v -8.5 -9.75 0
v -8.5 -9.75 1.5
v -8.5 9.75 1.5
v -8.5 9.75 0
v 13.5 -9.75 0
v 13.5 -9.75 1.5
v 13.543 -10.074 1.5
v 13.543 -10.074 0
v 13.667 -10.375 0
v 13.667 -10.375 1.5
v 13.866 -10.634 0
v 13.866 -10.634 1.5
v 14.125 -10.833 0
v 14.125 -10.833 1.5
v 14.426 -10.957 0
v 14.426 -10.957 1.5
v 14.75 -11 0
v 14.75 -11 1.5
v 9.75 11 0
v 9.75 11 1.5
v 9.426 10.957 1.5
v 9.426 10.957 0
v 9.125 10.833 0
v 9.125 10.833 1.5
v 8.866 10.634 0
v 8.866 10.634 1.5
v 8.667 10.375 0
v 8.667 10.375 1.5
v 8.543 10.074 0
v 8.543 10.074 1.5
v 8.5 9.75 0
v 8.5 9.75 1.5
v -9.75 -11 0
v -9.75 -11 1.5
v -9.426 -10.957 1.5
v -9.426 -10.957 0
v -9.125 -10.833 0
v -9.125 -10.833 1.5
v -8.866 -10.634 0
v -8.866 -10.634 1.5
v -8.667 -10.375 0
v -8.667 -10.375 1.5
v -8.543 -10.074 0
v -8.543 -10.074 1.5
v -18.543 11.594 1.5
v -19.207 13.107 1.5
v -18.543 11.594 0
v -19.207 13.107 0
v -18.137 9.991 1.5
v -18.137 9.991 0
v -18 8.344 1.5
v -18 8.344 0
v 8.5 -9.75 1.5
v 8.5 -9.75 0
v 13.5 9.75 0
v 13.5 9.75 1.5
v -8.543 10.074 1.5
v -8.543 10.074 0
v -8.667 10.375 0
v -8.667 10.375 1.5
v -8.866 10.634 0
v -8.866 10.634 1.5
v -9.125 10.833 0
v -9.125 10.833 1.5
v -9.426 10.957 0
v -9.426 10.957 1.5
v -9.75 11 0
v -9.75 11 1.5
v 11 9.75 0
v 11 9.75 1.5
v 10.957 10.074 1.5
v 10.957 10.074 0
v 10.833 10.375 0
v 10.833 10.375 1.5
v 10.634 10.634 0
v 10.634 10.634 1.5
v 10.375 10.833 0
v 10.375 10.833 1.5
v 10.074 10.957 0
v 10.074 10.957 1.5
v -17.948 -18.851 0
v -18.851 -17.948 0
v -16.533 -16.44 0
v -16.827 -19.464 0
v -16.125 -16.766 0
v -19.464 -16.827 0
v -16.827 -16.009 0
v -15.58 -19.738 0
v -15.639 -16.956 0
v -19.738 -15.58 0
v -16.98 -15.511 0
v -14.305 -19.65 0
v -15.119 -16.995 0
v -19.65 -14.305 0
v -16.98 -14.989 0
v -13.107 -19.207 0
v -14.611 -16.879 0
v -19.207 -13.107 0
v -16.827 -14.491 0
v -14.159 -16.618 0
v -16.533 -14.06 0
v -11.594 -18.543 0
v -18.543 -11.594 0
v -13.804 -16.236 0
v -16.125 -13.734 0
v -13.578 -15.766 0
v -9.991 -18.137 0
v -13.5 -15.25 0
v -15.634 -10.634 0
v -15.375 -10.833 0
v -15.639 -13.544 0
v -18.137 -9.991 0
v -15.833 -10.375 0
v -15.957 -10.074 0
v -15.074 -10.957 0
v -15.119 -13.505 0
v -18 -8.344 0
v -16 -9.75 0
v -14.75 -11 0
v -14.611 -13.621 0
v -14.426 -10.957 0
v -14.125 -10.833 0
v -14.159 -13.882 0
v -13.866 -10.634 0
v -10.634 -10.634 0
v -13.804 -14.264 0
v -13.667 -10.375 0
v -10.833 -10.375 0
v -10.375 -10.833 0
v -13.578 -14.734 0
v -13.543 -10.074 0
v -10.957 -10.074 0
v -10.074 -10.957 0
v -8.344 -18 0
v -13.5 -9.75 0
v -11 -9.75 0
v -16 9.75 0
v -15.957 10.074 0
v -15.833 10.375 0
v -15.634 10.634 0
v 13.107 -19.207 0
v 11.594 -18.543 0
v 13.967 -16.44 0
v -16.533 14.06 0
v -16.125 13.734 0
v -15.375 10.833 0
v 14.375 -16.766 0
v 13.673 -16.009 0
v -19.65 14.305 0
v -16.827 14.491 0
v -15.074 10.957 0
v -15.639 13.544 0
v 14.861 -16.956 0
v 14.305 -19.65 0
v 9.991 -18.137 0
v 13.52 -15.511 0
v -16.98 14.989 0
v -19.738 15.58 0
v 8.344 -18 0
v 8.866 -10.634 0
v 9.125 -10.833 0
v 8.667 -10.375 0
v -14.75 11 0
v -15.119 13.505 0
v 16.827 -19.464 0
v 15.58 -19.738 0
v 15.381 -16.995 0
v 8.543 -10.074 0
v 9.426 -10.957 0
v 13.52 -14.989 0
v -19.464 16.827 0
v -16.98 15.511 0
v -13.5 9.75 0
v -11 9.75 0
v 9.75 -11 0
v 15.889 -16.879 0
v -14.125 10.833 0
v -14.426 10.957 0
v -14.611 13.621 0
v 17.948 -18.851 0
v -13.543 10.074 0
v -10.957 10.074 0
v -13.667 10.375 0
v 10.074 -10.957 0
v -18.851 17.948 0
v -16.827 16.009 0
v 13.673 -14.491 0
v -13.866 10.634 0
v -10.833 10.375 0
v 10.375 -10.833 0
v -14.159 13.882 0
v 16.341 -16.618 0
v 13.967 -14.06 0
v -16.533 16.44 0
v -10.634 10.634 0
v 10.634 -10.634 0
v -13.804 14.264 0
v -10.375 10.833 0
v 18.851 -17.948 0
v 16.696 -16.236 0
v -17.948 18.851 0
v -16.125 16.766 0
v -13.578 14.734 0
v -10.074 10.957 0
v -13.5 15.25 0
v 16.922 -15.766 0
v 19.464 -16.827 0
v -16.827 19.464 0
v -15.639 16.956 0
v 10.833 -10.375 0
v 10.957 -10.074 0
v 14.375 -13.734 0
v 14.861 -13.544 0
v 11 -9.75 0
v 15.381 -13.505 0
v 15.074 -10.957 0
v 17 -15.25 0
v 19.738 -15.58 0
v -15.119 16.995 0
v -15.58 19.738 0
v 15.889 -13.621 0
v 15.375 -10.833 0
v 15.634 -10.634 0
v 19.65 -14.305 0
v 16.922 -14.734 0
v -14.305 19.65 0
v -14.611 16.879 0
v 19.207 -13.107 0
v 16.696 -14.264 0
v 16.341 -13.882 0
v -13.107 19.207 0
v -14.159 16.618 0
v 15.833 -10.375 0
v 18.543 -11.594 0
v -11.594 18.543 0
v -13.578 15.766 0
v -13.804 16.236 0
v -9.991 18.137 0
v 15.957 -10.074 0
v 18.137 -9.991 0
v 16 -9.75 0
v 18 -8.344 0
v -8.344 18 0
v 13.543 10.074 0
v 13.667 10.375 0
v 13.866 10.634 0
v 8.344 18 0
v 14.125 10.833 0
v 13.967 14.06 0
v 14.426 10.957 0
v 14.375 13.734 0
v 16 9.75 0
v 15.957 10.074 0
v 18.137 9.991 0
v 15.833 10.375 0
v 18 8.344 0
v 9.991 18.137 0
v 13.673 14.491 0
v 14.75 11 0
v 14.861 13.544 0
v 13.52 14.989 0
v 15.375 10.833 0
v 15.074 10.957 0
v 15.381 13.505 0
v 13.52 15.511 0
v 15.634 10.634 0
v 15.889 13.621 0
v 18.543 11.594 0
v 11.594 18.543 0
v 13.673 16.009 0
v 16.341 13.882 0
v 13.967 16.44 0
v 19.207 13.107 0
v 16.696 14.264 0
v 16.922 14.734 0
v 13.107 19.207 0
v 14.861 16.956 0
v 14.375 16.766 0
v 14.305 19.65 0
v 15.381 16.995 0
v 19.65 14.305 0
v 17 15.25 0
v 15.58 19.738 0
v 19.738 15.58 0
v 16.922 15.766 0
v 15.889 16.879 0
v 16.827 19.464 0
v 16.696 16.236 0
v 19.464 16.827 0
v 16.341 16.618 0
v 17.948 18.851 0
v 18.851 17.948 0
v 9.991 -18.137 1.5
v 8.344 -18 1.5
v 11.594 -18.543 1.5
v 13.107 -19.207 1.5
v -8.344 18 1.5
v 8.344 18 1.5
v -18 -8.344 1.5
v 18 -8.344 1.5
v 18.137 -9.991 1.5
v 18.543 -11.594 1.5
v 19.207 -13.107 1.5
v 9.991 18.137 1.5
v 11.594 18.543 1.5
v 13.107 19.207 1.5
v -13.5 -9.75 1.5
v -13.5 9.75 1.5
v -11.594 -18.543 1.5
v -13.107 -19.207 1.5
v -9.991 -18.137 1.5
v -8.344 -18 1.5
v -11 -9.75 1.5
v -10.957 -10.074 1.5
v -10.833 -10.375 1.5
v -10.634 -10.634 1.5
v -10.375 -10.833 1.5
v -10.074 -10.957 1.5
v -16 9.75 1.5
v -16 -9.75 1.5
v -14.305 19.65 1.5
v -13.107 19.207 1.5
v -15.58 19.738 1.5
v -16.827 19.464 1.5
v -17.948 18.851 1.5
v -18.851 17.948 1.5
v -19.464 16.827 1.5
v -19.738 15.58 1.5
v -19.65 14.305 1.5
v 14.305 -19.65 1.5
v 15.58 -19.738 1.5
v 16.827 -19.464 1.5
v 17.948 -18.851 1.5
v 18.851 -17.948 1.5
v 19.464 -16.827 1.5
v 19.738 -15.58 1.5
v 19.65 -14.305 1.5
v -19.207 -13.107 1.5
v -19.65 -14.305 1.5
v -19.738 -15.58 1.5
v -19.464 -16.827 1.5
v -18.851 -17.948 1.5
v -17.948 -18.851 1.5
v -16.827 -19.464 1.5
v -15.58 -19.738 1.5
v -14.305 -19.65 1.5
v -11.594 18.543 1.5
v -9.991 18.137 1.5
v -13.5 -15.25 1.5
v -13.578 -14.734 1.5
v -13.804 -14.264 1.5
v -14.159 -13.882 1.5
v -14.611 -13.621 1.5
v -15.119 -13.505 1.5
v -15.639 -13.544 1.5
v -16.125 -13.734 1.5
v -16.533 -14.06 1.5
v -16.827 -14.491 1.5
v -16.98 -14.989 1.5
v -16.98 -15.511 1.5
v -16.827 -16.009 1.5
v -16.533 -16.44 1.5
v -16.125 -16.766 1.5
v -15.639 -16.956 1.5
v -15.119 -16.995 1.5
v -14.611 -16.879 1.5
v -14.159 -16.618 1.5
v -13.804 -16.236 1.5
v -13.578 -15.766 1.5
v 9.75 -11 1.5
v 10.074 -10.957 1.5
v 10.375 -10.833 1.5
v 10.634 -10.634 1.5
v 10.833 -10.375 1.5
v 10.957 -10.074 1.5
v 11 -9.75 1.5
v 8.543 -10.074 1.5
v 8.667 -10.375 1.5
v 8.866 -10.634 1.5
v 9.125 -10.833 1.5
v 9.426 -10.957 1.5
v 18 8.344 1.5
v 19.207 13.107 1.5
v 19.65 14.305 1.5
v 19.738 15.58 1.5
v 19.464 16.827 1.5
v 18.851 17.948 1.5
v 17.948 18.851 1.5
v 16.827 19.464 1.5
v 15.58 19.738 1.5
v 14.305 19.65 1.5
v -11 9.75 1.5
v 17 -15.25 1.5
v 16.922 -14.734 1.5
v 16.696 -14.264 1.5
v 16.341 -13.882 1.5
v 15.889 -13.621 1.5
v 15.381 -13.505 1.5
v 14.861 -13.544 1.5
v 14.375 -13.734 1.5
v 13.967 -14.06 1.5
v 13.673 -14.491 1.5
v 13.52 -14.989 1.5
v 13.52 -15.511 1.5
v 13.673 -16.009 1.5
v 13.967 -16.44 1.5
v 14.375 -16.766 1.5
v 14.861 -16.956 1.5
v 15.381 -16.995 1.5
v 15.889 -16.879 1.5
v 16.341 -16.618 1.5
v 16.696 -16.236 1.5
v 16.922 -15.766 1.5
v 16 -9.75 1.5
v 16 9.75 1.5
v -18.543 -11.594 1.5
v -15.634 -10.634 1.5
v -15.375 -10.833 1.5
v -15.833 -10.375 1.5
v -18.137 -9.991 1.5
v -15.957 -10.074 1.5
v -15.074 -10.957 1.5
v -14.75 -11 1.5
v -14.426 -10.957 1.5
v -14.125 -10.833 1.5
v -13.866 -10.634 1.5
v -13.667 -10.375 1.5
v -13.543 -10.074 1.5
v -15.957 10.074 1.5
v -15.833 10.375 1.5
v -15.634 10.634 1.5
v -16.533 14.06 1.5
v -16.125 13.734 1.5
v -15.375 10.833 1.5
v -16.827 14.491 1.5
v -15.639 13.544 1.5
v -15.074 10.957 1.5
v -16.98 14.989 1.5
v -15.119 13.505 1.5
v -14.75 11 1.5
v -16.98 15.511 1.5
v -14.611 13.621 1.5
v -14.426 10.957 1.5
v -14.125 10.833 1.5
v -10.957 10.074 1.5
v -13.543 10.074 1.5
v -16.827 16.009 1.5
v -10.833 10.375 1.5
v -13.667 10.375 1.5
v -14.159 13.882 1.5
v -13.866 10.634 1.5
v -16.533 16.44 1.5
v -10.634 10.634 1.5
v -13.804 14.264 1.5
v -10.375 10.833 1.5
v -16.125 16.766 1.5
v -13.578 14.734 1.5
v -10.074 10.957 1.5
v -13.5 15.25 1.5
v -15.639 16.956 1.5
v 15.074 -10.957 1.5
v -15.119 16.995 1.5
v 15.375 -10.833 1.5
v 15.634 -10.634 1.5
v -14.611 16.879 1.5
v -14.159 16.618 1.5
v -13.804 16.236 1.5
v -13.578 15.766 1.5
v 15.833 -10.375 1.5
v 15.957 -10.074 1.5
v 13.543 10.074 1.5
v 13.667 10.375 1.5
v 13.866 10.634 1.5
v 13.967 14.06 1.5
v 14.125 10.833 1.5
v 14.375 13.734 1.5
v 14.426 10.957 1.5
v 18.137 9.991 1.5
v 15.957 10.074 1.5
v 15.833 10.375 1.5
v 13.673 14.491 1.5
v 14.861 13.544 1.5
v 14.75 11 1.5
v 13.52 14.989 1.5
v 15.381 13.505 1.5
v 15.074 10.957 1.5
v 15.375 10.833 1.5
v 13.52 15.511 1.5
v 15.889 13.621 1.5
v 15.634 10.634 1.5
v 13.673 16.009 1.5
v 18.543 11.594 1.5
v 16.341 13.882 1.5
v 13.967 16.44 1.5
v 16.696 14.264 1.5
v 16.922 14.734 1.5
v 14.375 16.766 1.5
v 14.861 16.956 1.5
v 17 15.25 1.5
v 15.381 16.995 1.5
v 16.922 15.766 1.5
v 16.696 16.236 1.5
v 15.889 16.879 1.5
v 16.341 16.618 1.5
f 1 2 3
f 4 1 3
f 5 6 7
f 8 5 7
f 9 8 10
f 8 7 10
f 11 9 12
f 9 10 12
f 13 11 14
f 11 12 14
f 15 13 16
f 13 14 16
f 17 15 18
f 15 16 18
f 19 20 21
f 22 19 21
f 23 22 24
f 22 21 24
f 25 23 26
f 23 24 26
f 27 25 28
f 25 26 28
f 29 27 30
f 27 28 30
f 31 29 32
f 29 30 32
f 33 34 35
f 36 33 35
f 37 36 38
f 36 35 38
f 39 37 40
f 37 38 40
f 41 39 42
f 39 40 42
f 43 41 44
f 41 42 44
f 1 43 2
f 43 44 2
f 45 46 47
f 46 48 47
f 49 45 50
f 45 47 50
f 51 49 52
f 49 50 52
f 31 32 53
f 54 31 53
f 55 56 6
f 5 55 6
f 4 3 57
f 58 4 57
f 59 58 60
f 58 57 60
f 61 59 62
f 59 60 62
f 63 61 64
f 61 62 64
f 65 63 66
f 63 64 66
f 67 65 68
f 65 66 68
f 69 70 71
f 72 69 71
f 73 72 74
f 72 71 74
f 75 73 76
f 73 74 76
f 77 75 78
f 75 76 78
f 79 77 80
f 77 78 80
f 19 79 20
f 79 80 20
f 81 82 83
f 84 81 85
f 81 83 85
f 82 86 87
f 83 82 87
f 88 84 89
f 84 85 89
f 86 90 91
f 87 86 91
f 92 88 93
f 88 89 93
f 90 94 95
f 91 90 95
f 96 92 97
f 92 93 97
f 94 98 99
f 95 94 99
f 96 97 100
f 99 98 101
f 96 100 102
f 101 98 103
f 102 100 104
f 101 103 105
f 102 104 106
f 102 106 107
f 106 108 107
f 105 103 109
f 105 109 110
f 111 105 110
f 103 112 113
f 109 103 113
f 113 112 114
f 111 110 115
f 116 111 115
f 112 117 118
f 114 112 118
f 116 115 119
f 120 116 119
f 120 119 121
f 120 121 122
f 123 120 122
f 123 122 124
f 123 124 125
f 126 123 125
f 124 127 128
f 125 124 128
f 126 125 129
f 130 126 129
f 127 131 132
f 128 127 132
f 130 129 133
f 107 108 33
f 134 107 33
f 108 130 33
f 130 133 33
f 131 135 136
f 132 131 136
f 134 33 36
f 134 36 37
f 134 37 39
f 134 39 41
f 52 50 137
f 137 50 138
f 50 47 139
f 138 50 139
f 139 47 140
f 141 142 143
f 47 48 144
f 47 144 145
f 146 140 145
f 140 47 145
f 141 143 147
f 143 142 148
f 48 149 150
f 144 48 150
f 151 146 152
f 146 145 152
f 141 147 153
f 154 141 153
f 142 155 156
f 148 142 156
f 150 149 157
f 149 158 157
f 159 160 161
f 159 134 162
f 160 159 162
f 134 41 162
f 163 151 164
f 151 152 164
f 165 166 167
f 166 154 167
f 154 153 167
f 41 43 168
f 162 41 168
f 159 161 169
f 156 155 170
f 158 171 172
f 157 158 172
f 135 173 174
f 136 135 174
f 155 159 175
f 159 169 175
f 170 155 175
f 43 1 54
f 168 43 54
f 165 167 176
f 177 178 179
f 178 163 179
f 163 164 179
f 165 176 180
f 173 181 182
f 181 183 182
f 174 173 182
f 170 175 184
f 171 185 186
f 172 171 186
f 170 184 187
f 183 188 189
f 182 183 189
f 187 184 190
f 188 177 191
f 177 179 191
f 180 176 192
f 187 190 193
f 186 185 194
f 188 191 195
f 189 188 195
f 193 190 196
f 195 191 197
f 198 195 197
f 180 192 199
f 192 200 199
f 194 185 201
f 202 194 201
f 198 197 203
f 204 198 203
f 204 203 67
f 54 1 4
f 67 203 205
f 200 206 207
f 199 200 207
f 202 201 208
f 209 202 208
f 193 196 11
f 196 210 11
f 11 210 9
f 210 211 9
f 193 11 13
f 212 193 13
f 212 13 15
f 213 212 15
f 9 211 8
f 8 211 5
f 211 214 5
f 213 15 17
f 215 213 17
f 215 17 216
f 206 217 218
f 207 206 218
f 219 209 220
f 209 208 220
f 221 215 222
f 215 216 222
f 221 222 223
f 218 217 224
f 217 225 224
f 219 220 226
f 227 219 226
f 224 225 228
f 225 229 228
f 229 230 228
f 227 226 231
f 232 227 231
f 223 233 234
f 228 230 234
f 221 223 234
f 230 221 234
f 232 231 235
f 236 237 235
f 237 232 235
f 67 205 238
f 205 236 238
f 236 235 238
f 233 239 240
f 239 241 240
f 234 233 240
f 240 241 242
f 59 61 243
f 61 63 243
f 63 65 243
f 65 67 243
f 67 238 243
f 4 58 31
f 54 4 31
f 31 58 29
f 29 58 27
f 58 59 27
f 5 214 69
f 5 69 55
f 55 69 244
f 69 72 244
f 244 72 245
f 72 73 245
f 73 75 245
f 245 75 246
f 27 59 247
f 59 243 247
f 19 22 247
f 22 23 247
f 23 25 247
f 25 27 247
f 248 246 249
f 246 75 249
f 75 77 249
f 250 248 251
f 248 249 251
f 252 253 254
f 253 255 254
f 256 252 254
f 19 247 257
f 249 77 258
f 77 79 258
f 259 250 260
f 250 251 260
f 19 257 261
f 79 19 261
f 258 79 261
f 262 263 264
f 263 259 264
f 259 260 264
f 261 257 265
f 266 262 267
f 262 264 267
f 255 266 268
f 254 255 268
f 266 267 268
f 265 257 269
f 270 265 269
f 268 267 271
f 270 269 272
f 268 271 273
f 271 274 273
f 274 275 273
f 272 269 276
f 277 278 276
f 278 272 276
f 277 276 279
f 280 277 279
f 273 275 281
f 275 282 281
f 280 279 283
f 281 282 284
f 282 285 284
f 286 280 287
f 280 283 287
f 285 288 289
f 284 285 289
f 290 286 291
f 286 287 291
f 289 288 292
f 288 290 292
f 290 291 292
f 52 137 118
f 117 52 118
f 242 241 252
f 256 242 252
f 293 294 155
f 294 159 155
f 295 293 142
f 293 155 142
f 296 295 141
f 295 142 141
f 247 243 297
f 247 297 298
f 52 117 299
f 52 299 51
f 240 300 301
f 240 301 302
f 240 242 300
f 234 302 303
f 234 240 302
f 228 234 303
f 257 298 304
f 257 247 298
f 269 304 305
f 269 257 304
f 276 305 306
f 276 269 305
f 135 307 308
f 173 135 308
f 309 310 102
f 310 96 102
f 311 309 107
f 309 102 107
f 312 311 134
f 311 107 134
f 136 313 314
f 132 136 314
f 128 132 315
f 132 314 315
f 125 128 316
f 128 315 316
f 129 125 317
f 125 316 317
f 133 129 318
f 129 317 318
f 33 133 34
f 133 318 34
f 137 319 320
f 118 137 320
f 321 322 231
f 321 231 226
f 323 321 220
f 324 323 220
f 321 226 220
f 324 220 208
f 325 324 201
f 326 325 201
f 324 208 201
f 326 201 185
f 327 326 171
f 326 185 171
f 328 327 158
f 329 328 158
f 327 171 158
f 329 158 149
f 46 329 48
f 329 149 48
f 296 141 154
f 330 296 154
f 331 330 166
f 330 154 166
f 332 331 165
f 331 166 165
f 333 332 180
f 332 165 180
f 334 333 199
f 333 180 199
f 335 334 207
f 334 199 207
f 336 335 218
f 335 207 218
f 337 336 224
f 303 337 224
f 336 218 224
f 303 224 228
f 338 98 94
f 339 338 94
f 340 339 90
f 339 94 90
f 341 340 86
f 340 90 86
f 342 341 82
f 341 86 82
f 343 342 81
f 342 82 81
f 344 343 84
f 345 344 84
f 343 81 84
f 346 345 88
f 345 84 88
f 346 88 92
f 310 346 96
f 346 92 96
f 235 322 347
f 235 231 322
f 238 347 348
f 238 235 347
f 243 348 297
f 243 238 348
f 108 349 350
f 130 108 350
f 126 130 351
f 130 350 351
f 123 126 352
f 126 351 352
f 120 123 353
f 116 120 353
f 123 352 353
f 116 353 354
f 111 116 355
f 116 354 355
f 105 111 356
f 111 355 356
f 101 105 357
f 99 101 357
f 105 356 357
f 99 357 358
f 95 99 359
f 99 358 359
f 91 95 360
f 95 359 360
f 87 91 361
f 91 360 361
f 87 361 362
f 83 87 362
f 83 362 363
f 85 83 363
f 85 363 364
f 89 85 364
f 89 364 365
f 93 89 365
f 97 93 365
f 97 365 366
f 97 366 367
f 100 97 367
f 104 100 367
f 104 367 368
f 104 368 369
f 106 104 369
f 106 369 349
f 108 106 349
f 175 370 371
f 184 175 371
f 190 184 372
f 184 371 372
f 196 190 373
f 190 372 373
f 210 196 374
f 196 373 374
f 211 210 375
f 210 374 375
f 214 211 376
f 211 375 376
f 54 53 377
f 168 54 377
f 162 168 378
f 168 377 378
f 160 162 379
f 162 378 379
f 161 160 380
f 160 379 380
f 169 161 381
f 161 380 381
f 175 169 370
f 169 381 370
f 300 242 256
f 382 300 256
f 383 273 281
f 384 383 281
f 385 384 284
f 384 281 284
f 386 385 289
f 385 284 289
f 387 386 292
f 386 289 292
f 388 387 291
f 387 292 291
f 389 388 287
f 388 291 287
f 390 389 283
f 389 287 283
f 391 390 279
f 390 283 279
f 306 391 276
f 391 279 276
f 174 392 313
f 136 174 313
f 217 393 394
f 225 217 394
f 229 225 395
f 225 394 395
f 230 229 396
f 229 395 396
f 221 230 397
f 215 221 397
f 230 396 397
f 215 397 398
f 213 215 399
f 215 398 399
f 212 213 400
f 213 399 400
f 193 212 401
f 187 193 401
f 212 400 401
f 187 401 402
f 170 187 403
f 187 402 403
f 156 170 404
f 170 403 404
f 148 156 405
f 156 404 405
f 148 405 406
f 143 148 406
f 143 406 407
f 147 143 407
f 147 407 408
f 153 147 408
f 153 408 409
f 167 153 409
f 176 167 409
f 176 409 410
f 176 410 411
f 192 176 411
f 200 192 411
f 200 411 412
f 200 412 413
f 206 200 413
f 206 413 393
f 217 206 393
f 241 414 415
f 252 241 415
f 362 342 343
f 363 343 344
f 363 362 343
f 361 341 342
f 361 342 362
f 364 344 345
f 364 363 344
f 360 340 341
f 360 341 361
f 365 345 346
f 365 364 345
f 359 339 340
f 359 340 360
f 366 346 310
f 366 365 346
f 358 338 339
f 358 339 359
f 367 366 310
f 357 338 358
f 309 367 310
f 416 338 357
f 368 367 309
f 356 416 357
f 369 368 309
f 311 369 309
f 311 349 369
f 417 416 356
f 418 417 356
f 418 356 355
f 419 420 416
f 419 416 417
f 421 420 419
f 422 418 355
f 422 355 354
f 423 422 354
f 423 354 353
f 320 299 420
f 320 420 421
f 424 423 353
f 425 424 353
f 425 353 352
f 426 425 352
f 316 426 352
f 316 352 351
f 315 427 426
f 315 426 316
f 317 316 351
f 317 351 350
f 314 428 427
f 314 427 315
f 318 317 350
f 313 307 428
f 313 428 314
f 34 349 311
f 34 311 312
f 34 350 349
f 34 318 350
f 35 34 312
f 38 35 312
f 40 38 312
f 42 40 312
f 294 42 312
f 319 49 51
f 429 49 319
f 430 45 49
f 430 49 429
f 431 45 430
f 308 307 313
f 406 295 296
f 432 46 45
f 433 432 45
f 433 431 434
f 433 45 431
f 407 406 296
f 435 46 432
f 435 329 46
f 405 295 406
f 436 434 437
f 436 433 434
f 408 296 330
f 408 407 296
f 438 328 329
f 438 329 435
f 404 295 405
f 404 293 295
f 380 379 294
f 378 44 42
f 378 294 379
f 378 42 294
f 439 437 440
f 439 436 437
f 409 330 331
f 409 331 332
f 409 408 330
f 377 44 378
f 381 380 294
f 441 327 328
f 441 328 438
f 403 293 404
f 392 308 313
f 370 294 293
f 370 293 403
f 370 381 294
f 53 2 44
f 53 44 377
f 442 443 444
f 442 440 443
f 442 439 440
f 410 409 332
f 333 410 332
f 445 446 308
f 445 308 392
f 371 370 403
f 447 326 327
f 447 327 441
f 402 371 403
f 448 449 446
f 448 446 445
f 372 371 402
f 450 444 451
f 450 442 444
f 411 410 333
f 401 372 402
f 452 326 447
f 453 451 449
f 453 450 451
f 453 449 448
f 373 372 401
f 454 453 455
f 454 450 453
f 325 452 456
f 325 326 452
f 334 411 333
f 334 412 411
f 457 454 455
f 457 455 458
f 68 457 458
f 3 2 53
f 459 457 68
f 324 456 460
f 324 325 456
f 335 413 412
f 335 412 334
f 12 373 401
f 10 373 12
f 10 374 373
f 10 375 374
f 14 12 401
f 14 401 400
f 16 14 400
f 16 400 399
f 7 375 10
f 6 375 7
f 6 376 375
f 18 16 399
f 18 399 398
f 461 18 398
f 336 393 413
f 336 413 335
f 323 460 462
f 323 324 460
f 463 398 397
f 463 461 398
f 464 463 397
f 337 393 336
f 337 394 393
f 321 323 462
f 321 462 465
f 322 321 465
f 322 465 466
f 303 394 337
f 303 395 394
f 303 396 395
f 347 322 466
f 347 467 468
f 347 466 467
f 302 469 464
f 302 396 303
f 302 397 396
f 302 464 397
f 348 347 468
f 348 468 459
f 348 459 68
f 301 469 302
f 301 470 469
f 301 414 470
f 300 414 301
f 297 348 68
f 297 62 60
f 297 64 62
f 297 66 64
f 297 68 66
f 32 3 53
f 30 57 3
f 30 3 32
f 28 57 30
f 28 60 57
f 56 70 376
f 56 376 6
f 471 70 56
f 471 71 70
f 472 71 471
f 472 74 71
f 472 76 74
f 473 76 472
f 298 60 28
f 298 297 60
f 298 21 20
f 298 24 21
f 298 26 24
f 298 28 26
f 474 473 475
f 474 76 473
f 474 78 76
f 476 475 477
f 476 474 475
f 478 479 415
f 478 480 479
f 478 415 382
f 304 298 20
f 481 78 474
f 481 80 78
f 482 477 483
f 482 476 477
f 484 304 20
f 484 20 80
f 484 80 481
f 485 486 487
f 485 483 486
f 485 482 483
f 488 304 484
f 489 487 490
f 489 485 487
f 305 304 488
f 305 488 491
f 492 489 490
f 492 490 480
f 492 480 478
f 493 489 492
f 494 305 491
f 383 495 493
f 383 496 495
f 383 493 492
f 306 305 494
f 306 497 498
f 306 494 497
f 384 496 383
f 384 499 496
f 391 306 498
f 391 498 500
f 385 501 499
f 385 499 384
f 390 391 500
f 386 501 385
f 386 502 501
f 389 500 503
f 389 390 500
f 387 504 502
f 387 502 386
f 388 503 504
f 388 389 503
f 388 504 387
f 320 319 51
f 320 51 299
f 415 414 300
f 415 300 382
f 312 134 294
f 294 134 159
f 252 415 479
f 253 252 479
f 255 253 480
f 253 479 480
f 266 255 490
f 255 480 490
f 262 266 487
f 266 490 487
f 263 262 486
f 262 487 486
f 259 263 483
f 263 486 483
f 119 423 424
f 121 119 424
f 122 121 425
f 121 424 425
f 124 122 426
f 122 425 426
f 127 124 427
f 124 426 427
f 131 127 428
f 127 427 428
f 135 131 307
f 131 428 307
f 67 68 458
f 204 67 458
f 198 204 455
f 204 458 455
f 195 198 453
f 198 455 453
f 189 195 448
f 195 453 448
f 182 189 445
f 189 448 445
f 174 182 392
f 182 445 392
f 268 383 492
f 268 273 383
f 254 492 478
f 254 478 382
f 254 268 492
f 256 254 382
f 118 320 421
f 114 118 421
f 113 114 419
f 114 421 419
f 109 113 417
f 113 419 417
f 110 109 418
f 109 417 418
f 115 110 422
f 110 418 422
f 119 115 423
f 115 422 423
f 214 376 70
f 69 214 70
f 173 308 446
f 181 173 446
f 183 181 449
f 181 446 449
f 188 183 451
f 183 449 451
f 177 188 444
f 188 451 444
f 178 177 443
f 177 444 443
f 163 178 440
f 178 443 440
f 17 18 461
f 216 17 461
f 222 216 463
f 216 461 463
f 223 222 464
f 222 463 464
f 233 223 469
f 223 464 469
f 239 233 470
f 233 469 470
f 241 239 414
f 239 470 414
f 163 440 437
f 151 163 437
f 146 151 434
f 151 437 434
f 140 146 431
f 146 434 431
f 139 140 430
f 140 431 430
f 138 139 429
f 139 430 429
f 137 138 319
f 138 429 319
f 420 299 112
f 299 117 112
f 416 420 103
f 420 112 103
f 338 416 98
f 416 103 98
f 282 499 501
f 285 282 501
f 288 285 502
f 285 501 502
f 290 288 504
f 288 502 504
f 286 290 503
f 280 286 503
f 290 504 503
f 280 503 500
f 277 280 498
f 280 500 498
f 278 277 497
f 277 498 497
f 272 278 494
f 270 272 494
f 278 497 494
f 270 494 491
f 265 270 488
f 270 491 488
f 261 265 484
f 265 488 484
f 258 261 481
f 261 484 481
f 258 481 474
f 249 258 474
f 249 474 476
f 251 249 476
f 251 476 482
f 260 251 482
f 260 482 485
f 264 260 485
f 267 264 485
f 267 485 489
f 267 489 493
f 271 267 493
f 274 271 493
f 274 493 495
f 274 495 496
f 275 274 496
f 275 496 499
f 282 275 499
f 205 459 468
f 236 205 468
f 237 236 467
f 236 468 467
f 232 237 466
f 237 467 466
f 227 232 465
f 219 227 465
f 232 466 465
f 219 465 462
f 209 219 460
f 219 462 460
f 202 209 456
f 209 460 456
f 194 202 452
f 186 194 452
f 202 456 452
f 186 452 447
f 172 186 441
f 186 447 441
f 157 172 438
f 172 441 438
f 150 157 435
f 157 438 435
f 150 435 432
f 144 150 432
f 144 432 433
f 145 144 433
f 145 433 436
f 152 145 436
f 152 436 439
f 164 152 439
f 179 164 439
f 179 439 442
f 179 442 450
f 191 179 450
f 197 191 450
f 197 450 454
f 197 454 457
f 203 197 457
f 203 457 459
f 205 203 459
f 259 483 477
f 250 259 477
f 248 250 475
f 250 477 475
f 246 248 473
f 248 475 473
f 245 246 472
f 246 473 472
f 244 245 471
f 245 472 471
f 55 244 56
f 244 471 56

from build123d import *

# Parameters (mm, degrees)
F0_W     = 36
F0_H     = 36
F1_DEPTH = 1.5
F2_R     = 4.5
F3_DEPTH = 1.5
F4_R     = 1.75
F5_DEPTH = 1.501
F7_DEPTH = 1.501
F8_R     = 10


with BuildPart() as f1:
    # F0 (on Top) → F1 (new body)
    with BuildSketch(Plane.XY):
        Rectangle(F0_W, F0_H)
    extrude(amount=F1_DEPTH)

    # F2 (on Top) → F3 (join)
    with BuildSketch(Plane.XY):
        with Locations((-15.25, 15.25)):
            Circle(F2_R)
        with Locations((15.25, 15.25)):
            Circle(F2_R)
        with Locations((-15.25, -15.25)):
            Circle(F2_R)
        with Locations((15.25, -15.25)):
            Circle(F2_R)
    extrude(amount=F3_DEPTH)

    # F4 (on face) → F5 (cut, through all)
    with BuildSketch(Plane.XY.offset(1.5)):
        with Locations((-15.25, -15.25)):
            Circle(F4_R)
        with Locations((15.25, -15.25)):
            Circle(F4_R)
        with Locations((-15.25, 15.25)):
            Circle(F4_R)
        with Locations((15.25, 15.25)):
            Circle(F4_R)
    extrude(amount=-F5_DEPTH, mode=Mode.SUBTRACT)

    # F6 (on face) → F7 (cut, through all)
    with BuildSketch(Plane.XY.offset(1.5)):
        with BuildLine():
            ThreePointArc((-9.75, 11), (-10.6338834765, 10.6338834765), (-11, 9.75))
            Line((-11, 9.75), (-11, -9.75))
            ThreePointArc((-11, -9.75), (-10.6338834765, -10.6338834765), (-9.75, -11))
            ThreePointArc((-9.75, -11), (-8.8661165235, -10.6338834765), (-8.5, -9.75))
            Line((-8.5, -9.75), (-8.5, 9.75))
            ThreePointArc((-8.5, 9.75), (-8.8661165235, 10.6338834765), (-9.75, 11))
        make_face()
        with BuildLine():
            ThreePointArc((-14.75, 11), (-15.6338834765, 10.6338834765), (-16, 9.75))
            Line((-16, 9.75), (-16, -9.75))
            ThreePointArc((-16, -9.75), (-15.6338834765, -10.6338834765), (-14.75, -11))
            ThreePointArc((-14.75, -11), (-13.8661165235, -10.6338834765), (-13.5, -9.75))
            Line((-13.5, -9.75), (-13.5, 9.75))
            ThreePointArc((-13.5, 9.75), (-13.8661165235, 10.6338834765), (-14.75, 11))
        make_face()
        with BuildLine():
            ThreePointArc((9.75, 11), (8.8661165235, 10.6338834765), (8.5, 9.75))
            Line((8.5, 9.75), (8.5, -9.75))
            ThreePointArc((8.5, -9.75), (8.8661165235, -10.6338834765), (9.75, -11))
            ThreePointArc((9.75, -11), (10.6338834765, -10.6338834765), (11, -9.75))
            Line((11, -9.75), (11, 9.75))
            ThreePointArc((11, 9.75), (10.6338834765, 10.6338834765), (9.75, 11))
        make_face()
        with BuildLine():
            Line((16, -9.75), (16, 9.75))
            ThreePointArc((16, 9.75), (15.6338834765, 10.6338834765), (14.75, 11))
            ThreePointArc((14.75, 11), (13.8661165235, 10.6338834765), (13.5, 9.75))
            Line((13.5, 9.75), (13.5, -9.75))
            ThreePointArc((13.5, -9.75), (13.8661165235, -10.6338834765), (14.75, -11))
            ThreePointArc((14.75, -11), (15.6338834765, -10.6338834765), (16, -9.75))
        make_face()
    extrude(amount=-F7_DEPTH, mode=Mode.SUBTRACT)

    # F8
    f8_edges = [f1.edges().sort_by_distance(p)[0] for p in [
        (-18, 11.688048, 0.75),
        (-11.688048, 18, 0.75),
        (11.688048, 18, 0.75),
        (18, 11.688048, 0.75),
        (18, -11.688048, 0.75),
        (11.688048, -18, 0.75),
        (-11.688048, -18, 0.75),
        (-18, -11.688048, 0.75),
    ]]
    fillet(f8_edges, radius=F8_R)


solid = f1.part
